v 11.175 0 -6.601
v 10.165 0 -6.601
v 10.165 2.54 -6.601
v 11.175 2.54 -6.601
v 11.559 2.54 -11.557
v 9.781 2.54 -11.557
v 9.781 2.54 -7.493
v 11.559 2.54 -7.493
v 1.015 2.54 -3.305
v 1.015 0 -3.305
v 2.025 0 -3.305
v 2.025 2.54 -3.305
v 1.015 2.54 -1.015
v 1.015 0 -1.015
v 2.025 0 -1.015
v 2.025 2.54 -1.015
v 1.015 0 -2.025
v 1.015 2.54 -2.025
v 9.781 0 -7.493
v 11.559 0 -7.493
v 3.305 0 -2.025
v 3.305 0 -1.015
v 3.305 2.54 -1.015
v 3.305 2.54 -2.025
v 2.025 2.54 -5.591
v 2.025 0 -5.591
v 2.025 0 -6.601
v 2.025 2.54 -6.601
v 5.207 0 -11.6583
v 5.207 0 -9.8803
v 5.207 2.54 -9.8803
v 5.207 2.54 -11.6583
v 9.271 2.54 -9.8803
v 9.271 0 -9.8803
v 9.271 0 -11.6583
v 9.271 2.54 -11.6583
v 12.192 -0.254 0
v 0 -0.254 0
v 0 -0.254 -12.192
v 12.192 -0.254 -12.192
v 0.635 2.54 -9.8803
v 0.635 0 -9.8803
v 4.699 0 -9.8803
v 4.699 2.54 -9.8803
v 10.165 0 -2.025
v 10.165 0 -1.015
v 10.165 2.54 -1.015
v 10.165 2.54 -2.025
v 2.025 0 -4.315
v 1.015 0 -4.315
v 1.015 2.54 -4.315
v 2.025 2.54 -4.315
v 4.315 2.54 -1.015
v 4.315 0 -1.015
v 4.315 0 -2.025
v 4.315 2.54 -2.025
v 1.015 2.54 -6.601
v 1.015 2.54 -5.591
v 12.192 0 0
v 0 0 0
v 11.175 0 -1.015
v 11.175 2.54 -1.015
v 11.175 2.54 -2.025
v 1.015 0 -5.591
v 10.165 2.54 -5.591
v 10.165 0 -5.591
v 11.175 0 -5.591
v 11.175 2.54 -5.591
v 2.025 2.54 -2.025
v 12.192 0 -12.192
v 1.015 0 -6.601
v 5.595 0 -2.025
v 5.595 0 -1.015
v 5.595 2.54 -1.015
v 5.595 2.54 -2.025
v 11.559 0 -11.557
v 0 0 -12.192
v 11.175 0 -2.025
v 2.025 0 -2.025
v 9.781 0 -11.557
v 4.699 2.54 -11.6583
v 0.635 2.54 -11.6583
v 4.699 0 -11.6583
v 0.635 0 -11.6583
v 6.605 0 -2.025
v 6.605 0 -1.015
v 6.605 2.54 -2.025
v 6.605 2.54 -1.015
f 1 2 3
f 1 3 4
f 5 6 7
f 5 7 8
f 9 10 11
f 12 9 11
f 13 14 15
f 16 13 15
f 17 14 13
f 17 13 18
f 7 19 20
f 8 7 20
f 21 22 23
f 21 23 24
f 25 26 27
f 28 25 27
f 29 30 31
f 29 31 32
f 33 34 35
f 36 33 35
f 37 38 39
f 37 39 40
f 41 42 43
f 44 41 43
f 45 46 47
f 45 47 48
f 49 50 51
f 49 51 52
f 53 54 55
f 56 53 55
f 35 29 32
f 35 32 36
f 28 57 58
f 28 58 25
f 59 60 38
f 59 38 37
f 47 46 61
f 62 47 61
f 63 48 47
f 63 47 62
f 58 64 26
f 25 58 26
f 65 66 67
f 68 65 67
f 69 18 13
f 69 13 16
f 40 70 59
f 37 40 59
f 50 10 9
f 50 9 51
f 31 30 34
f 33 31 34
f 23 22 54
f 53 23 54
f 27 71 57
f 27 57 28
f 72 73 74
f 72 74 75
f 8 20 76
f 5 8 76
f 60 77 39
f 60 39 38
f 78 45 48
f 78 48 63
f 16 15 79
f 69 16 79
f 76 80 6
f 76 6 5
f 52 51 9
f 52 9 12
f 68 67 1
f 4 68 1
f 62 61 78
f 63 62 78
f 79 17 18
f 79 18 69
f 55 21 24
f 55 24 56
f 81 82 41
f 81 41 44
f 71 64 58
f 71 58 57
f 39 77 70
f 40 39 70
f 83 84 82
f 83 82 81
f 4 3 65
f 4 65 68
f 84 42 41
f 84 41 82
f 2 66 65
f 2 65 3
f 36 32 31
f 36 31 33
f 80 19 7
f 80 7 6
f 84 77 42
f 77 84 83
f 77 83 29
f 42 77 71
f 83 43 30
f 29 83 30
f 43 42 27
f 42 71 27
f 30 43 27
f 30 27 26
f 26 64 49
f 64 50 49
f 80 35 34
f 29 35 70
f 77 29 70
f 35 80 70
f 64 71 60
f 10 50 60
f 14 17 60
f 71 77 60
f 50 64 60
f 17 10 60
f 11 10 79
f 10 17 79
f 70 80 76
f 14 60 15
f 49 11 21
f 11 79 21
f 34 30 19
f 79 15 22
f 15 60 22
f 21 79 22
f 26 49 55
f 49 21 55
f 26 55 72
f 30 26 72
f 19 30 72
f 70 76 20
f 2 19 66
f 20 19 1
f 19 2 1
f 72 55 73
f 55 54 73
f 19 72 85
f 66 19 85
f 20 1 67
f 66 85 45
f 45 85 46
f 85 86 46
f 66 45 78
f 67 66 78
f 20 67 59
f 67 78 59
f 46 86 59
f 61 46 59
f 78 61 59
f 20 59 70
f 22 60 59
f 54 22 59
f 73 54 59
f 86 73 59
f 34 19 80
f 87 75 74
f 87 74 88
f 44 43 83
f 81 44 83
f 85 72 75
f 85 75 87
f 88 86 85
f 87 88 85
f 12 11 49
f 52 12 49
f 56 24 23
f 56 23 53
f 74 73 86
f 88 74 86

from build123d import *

# Parameters (mm, degrees)
SKETCH1_W              = 1.01
SKETCH1_H              = 1.01
BOSS_EXTRUDE1_DEPTH    = 2.54
BOSS_EXTRUDE1_2_DEPTH  = 2.54
BOSS_EXTRUDE1_3_DEPTH  = 2.54
BOSS_EXTRUDE1_4_DEPTH  = 2.54
BOSS_EXTRUDE1_5_DEPTH  = 2.54
BOSS_EXTRUDE1_6_DEPTH  = 2.54
BOSS_EXTRUDE1_7_DEPTH  = 2.54
SKETCH1_W_2            = 1.778
SKETCH1_H_2            = 4.064
BOSS_EXTRUDE1_8_DEPTH  = 2.54
SKETCH1_W_3            = 4.064
SKETCH1_H_3            = 1.778
BOSS_EXTRUDE1_9_DEPTH  = 2.54
BOSS_EXTRUDE1_10_DEPTH = 2.54
SKETCH3_W              = 12.192
SKETCH3_H              = 12.192
BOSS_EXTRUDE2_DEPTH    = 0.254


with BuildPart() as part:
    # Sketch1 (on Top Plane) → Boss-Extrude1 (new body)
    with BuildSketch(Plane(origin=(0, 0, 0), x_dir=(1, 0, 0), z_dir=(0, 1, 0))):
        with Locations((1.52, 1.52)):
            Rectangle(SKETCH1_W, SKETCH1_H)
    extrude(amount=BOSS_EXTRUDE1_DEPTH)



with BuildPart() as body_2:
    # Sketch1 (on Top Plane) → Boss-Extrude1 2 (new body)
    with BuildSketch(Plane(origin=(0, 0, 0), x_dir=(1, 0, 0), z_dir=(0, 1, 0))):
        with Locations((1.52, 6.096)):
            Rectangle(SKETCH1_W, SKETCH1_H)
    extrude(amount=BOSS_EXTRUDE1_2_DEPTH)


with BuildPart() as body_3:
    # Sketch1 (on Top Plane) → Boss-Extrude1 3 (new body)
    with BuildSketch(Plane(origin=(0, 0, 0), x_dir=(1, 0, 0), z_dir=(0, 1, 0))):
        with Locations((1.52, 3.81)):
            Rectangle(SKETCH1_W, SKETCH1_H)
    extrude(amount=BOSS_EXTRUDE1_3_DEPTH)


with BuildPart() as body_4:
    # Sketch1 (on Top Plane) → Boss-Extrude1 4 (new body)
    with BuildSketch(Plane(origin=(0, 0, 0), x_dir=(1, 0, 0), z_dir=(0, 1, 0))):
        with Locations((10.67, 1.52)):
            Rectangle(SKETCH1_W, SKETCH1_H)
    extrude(amount=BOSS_EXTRUDE1_4_DEPTH)


with BuildPart() as body_5:
    # Sketch1 (on Top Plane) → Boss-Extrude1 5 (new body)
    with BuildSketch(Plane(origin=(0, 0, 0), x_dir=(1, 0, 0), z_dir=(0, 1, 0))):
        with Locations((6.1, 1.52)):
            Rectangle(SKETCH1_W, SKETCH1_H)
    extrude(amount=BOSS_EXTRUDE1_5_DEPTH)


with BuildPart() as body_6:
    # Sketch1 (on Top Plane) → Boss-Extrude1 6 (new body)
    with BuildSketch(Plane(origin=(0, 0, 0), x_dir=(1, 0, 0), z_dir=(0, 1, 0))):
        with Locations((3.81, 1.52)):
            Rectangle(SKETCH1_W, SKETCH1_H)
    extrude(amount=BOSS_EXTRUDE1_6_DEPTH)


with BuildPart() as body_7:
    # Sketch1 (on Top Plane) → Boss-Extrude1 7 (new body)
    with BuildSketch(Plane(origin=(0, 0, 0), x_dir=(1, 0, 0), z_dir=(0, 1, 0))):
        with Locations((10.67, 6.096)):
            Rectangle(SKETCH1_W, SKETCH1_H)
    extrude(amount=BOSS_EXTRUDE1_7_DEPTH)


with BuildPart() as body_8:
    # Sketch1 (on Top Plane) → Boss-Extrude1 8 (new body)
    with BuildSketch(Plane(origin=(0, 0, 0), x_dir=(1, 0, 0), z_dir=(0, 1, 0))):
        with Locations((10.67, 9.525)):
            Rectangle(SKETCH1_W_2, SKETCH1_H_2)
    extrude(amount=BOSS_EXTRUDE1_8_DEPTH)


with BuildPart() as body_9:
    # Sketch1 (on Top Plane) → Boss-Extrude1 9 (new body)
    with BuildSketch(Plane(origin=(0, 0, 0), x_dir=(1, 0, 0), z_dir=(0, 1, 0))):
        with Locations((2.667, 10.769327267)):
            Rectangle(SKETCH1_W_3, SKETCH1_H_3)
    extrude(amount=BOSS_EXTRUDE1_9_DEPTH)


with BuildPart() as body_10:
    # Sketch1 (on Top Plane) → Boss-Extrude1 10 (new body)
    with BuildSketch(Plane(origin=(0, 0, 0), x_dir=(1, 0, 0), z_dir=(0, 1, 0))):
        with Locations((7.239, 10.769327267)):
            Rectangle(SKETCH1_W_3, SKETCH1_H_3)
    extrude(amount=BOSS_EXTRUDE1_10_DEPTH)


with BuildPart() as part_1:
    add(part.part)

    add(body_2.part)  # Boss-Extrude2 merges body 2

    add(body_3.part)  # Boss-Extrude2 merges body 3

    add(body_4.part)  # Boss-Extrude2 merges body 4

    add(body_5.part)  # Boss-Extrude2 merges body 5

    add(body_6.part)  # Boss-Extrude2 merges body 6

    add(body_7.part)  # Boss-Extrude2 merges body 7

    add(body_8.part)  # Boss-Extrude2 merges body 8

    add(body_9.part)  # Boss-Extrude2 merges body 9

    add(body_10.part)  # Boss-Extrude2 merges body 10
    # Sketch3 → Boss-Extrude2 (add)
    with BuildSketch(Plane.XZ):
        with Locations((6.096, -6.096)):
            Rectangle(SKETCH3_W, SKETCH3_H)
    extrude(amount=BOSS_EXTRUDE2_DEPTH)


solid = part_1.part
